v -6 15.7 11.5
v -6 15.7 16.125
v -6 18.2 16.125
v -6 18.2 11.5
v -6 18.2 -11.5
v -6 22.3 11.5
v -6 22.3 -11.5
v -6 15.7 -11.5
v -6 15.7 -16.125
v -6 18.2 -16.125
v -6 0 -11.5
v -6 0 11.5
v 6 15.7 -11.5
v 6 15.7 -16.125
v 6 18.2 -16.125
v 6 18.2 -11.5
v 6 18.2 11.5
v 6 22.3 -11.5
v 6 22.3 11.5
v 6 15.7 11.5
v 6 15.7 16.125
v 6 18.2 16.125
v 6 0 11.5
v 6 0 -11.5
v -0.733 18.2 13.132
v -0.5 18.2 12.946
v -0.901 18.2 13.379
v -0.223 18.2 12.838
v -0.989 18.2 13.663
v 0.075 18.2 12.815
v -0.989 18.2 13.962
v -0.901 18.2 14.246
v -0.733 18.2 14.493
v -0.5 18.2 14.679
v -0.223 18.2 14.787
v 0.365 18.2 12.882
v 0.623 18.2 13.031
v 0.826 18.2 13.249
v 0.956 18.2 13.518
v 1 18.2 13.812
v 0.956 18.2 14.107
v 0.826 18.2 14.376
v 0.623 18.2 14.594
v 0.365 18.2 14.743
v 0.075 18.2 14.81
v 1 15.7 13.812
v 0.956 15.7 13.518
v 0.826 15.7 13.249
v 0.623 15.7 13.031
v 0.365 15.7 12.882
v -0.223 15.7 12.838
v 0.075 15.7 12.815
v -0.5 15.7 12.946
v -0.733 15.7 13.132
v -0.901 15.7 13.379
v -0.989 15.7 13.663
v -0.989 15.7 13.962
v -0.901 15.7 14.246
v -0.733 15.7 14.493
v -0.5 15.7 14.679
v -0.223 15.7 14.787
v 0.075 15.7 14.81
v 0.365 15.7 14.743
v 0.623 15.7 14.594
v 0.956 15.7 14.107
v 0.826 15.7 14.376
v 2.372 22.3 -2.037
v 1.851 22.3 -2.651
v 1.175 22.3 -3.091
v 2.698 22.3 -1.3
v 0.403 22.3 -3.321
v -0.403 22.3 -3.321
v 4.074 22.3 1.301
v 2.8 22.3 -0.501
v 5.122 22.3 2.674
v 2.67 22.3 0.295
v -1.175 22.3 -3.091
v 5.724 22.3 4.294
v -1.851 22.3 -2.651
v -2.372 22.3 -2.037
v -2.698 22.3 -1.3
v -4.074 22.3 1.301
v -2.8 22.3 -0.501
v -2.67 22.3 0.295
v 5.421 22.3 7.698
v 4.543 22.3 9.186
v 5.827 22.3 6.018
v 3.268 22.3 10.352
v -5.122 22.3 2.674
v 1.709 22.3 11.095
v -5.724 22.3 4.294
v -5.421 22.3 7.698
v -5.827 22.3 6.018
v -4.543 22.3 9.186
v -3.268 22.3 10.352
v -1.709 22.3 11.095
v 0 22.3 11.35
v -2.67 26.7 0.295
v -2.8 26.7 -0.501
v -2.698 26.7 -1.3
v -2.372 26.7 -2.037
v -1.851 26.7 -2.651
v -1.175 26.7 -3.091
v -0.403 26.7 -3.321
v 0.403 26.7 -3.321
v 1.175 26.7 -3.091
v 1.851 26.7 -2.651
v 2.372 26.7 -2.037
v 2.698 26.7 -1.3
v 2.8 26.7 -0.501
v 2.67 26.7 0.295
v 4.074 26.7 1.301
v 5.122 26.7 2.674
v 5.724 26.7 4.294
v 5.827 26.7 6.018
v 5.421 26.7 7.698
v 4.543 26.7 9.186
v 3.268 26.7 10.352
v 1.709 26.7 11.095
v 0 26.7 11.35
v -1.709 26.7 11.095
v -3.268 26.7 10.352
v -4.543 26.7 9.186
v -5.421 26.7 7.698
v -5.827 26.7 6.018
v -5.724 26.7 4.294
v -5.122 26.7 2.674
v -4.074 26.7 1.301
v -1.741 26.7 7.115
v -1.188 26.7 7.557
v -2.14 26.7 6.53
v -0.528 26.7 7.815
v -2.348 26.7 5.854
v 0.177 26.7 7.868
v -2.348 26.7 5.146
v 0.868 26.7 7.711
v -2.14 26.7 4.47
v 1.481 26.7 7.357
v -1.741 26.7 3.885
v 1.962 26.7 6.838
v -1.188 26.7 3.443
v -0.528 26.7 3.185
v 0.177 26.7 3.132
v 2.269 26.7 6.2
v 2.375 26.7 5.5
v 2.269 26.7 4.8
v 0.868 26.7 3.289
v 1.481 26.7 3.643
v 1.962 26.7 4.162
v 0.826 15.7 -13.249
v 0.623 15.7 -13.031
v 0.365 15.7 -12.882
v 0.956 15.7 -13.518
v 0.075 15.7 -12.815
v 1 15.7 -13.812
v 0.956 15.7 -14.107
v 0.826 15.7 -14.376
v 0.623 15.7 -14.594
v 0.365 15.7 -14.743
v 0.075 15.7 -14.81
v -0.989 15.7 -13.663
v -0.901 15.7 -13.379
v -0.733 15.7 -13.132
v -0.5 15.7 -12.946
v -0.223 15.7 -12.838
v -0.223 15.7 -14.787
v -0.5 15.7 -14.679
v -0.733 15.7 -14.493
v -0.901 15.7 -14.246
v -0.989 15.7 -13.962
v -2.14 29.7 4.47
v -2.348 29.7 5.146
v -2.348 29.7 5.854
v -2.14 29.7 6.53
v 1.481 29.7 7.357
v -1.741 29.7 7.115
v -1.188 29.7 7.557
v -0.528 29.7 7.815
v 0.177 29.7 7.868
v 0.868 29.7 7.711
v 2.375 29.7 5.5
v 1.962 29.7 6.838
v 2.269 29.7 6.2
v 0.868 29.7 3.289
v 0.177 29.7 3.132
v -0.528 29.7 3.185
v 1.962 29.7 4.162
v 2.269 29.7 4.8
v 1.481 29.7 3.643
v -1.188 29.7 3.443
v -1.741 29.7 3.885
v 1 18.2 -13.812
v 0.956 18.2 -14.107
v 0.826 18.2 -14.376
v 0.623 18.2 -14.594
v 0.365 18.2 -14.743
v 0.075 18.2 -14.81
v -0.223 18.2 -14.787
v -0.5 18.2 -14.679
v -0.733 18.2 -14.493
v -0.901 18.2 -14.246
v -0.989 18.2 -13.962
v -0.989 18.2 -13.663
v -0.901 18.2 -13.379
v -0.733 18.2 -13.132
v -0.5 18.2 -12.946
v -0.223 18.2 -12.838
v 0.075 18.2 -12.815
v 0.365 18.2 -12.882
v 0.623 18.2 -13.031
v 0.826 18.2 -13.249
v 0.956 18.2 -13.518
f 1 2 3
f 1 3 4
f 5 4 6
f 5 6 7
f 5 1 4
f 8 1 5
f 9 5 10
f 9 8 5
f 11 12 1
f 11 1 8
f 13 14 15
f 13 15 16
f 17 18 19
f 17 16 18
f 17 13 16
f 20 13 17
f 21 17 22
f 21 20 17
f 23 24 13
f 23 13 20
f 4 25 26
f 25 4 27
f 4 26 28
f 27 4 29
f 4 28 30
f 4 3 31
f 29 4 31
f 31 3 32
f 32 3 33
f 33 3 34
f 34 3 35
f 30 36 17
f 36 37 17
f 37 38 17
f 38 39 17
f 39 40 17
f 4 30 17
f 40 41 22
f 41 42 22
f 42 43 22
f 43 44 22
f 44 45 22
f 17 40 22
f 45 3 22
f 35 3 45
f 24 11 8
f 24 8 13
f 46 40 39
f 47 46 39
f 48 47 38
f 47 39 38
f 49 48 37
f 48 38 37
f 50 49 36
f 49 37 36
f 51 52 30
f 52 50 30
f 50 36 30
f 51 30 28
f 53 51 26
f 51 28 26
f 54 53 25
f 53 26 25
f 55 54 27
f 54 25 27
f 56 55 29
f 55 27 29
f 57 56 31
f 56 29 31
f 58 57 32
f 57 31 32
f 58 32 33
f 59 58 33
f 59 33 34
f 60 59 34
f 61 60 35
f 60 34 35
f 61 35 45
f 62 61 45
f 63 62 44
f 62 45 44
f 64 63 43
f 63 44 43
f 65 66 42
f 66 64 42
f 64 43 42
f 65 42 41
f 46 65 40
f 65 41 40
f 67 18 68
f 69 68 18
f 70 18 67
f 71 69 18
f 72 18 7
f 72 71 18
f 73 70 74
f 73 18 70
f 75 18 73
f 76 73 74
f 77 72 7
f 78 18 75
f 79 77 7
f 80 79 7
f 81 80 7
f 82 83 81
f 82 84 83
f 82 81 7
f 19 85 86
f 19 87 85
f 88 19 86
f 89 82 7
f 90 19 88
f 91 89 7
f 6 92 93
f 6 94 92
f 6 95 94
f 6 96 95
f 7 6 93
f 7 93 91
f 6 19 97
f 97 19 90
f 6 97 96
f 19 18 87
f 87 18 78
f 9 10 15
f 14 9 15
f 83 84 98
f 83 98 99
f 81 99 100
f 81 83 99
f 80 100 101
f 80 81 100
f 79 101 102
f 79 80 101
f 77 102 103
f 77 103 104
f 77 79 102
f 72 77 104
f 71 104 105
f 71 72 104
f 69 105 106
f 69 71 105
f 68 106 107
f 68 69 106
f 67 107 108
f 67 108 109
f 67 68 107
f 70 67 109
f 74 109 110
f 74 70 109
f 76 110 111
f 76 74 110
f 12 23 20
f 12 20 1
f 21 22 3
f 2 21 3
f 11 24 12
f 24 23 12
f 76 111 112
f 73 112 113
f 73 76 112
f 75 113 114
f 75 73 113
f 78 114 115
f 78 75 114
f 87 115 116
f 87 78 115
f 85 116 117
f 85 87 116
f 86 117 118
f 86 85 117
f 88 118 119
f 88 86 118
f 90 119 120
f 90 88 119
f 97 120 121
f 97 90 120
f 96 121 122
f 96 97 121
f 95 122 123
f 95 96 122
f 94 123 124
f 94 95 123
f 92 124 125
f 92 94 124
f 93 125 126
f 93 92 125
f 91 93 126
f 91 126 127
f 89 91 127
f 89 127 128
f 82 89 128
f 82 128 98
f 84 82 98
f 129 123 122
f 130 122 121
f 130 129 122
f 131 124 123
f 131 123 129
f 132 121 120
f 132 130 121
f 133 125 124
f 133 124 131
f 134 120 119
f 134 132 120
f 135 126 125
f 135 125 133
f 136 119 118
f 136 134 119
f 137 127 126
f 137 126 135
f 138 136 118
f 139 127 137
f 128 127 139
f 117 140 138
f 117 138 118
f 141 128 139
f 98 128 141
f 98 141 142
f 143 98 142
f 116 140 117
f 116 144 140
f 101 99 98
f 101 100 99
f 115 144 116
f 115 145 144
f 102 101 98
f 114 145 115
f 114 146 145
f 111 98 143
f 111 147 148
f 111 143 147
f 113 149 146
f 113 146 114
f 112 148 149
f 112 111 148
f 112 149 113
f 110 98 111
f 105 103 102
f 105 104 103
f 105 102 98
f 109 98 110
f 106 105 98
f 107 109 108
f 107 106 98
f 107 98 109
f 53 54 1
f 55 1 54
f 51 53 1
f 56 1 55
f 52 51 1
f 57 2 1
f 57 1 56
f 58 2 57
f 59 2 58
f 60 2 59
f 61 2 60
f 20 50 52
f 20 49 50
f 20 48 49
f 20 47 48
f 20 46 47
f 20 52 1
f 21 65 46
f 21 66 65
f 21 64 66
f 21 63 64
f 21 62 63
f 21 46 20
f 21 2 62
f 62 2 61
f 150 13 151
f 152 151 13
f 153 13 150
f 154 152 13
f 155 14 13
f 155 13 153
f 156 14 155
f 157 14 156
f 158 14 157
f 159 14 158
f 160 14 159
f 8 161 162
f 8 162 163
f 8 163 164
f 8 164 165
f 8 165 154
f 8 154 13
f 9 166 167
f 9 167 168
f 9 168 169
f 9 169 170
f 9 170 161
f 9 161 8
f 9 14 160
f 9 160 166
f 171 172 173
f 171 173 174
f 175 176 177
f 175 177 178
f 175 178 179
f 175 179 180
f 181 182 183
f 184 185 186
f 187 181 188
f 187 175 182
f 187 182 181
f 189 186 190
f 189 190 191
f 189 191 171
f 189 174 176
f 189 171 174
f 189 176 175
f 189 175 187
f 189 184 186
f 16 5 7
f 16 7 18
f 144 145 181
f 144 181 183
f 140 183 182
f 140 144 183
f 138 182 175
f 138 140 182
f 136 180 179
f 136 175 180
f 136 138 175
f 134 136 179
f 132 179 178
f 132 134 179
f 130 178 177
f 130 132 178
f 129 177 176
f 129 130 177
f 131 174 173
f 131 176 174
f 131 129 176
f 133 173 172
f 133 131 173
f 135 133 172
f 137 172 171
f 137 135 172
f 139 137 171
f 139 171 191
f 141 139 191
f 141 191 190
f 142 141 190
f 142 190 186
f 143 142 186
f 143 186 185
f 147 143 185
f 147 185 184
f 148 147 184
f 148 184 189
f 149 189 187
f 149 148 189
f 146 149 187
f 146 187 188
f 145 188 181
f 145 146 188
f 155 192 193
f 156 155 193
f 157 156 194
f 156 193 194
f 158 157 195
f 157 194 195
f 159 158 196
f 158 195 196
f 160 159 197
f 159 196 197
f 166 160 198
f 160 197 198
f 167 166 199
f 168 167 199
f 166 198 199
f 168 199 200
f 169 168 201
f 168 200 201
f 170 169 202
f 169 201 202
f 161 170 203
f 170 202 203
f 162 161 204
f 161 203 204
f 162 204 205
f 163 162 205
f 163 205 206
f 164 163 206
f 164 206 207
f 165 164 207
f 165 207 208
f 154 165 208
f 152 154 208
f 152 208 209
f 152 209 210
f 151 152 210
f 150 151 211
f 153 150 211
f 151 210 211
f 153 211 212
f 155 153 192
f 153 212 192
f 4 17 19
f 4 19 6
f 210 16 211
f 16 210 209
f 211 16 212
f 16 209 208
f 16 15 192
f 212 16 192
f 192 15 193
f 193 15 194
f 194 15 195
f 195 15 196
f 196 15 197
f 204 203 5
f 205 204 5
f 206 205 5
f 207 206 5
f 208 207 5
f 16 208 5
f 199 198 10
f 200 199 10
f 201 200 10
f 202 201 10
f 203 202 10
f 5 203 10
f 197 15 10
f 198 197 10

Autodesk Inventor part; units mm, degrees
ref_plane "YZ Plane" through (0, 0, 0) normal (1, 0, 0) x (0, 1, 0)
sketch "Sketch1" plane through (0, 0, 0) normal (0, 1, 0) x (-1, 0, 0)
  line L0 (-6, 11.5) -> (6, 11.5)
  line L1 (6, 11.5) -> (6, -11.5)
  line L2 (6, -11.5) -> (-6, -11.5)
  line L3 (-6, -11.5) -> (-6, 11.5)
  point P0 (0, 0)
  point P1 (6, 0)
  point P2 (0, -11.5)
  dimension "d0" = 12
  dimension "d1" = 23
  dimension "d2" = 0
  dimension "d3" = 0
extrude "Extrusion1" add sketch "Sketch1" along normal blind 22.3
ref_plane "Work Plane1" through (0, 18.2, 0) normal (0, -1, 0) x (1, 0, 0)
sketch "Sketch2" plane through (0, 18.2, 0) normal (0, -1, 0) x (1, 0, 0)
  line L0 (-6, -11.5) -> (-6, 11.5) projected
  line L1 (-6, 11.5) -> (6, 11.5)
  line L2 (6, 11.5) -> (6, 16.125)
  line L3 (6, 16.125) -> (-6, 16.125)
  line L4 (-6, 16.125) -> (-6, 11.5)
  circle A0 centre (0, 13.8125) radius 1
  point P0 (0, 0)
  point P1 (0, 16.125)
  point P2 (6, 13.8125)
  dimension "d7" = 12
  dimension "d8" = 4.625
  dimension "d9" = 2
  dimension "d10" = 0
  dimension "d11" = 0
extrude "Extrusion2" add sketch "Sketch2" along normal blind 2.5
ref_plane "Work Plane2" through (-6, 0, 0) normal (0, 0, 1) x (1, 0, 0)
mirror "Mirror1" about plane through (-6, 0, 0) normal (0, 0, 1) of "Extrusion2"
sketch "Sketch3" plane through (0, 22.3, 0) normal (0, 1, 0) x (1, 0, 0)
  line L0 (6, 11.5) -> (-6, 11.5) projected
  line L1 (-6, 11.5) -> (-6, -11.5) projected
  line L2 (-6, -11.5) -> (6, -11.5) projected
  line L3 (6, -11.5) -> (6, 11.5) projected
  circle A0 centre (0, -5.5) radius 5.85
  circle A1 centre (0, 0.55) radius 2.8
  point P0 (0, 0)
  point P1 (0, -11.5)
  point P2 (2.6696, -0.2946)
  point P3 (-2.6696, -0.2946)
  dimension "d16" = 11.7
  dimension "d17" = 0
  dimension "d18" = 6
  dimension "d21" = 5.6
  dimension "d22" = 0
  dimension "d23" = 6.05
extrude "Extrusion3" add sketch "Sketch3" along normal blind 4.4 contours A0 A1 | A1 A0 | A0 A1
sketch "Sketch4" plane through (0, 26.7, 0) normal (0, 1, 0) x (1, 0, 0)
  arc A0 (-2.6696, -0.2946) -> (2.6696, -0.2946) centre (0, -5.5) ccw projected
  arc A1 (2.6696, -0.2946) -> (-2.6696, -0.2946) centre (0, 0.55) ccw projected
  circle A2 centre (0, -5.5) radius 2.375
  point P0 (0, 0)
  dimension "d24" = 4.75
extrude "Extrusion4" add sketch "Sketch4" along normal blind 3 contours A2
properties part number "Servo Motor"
